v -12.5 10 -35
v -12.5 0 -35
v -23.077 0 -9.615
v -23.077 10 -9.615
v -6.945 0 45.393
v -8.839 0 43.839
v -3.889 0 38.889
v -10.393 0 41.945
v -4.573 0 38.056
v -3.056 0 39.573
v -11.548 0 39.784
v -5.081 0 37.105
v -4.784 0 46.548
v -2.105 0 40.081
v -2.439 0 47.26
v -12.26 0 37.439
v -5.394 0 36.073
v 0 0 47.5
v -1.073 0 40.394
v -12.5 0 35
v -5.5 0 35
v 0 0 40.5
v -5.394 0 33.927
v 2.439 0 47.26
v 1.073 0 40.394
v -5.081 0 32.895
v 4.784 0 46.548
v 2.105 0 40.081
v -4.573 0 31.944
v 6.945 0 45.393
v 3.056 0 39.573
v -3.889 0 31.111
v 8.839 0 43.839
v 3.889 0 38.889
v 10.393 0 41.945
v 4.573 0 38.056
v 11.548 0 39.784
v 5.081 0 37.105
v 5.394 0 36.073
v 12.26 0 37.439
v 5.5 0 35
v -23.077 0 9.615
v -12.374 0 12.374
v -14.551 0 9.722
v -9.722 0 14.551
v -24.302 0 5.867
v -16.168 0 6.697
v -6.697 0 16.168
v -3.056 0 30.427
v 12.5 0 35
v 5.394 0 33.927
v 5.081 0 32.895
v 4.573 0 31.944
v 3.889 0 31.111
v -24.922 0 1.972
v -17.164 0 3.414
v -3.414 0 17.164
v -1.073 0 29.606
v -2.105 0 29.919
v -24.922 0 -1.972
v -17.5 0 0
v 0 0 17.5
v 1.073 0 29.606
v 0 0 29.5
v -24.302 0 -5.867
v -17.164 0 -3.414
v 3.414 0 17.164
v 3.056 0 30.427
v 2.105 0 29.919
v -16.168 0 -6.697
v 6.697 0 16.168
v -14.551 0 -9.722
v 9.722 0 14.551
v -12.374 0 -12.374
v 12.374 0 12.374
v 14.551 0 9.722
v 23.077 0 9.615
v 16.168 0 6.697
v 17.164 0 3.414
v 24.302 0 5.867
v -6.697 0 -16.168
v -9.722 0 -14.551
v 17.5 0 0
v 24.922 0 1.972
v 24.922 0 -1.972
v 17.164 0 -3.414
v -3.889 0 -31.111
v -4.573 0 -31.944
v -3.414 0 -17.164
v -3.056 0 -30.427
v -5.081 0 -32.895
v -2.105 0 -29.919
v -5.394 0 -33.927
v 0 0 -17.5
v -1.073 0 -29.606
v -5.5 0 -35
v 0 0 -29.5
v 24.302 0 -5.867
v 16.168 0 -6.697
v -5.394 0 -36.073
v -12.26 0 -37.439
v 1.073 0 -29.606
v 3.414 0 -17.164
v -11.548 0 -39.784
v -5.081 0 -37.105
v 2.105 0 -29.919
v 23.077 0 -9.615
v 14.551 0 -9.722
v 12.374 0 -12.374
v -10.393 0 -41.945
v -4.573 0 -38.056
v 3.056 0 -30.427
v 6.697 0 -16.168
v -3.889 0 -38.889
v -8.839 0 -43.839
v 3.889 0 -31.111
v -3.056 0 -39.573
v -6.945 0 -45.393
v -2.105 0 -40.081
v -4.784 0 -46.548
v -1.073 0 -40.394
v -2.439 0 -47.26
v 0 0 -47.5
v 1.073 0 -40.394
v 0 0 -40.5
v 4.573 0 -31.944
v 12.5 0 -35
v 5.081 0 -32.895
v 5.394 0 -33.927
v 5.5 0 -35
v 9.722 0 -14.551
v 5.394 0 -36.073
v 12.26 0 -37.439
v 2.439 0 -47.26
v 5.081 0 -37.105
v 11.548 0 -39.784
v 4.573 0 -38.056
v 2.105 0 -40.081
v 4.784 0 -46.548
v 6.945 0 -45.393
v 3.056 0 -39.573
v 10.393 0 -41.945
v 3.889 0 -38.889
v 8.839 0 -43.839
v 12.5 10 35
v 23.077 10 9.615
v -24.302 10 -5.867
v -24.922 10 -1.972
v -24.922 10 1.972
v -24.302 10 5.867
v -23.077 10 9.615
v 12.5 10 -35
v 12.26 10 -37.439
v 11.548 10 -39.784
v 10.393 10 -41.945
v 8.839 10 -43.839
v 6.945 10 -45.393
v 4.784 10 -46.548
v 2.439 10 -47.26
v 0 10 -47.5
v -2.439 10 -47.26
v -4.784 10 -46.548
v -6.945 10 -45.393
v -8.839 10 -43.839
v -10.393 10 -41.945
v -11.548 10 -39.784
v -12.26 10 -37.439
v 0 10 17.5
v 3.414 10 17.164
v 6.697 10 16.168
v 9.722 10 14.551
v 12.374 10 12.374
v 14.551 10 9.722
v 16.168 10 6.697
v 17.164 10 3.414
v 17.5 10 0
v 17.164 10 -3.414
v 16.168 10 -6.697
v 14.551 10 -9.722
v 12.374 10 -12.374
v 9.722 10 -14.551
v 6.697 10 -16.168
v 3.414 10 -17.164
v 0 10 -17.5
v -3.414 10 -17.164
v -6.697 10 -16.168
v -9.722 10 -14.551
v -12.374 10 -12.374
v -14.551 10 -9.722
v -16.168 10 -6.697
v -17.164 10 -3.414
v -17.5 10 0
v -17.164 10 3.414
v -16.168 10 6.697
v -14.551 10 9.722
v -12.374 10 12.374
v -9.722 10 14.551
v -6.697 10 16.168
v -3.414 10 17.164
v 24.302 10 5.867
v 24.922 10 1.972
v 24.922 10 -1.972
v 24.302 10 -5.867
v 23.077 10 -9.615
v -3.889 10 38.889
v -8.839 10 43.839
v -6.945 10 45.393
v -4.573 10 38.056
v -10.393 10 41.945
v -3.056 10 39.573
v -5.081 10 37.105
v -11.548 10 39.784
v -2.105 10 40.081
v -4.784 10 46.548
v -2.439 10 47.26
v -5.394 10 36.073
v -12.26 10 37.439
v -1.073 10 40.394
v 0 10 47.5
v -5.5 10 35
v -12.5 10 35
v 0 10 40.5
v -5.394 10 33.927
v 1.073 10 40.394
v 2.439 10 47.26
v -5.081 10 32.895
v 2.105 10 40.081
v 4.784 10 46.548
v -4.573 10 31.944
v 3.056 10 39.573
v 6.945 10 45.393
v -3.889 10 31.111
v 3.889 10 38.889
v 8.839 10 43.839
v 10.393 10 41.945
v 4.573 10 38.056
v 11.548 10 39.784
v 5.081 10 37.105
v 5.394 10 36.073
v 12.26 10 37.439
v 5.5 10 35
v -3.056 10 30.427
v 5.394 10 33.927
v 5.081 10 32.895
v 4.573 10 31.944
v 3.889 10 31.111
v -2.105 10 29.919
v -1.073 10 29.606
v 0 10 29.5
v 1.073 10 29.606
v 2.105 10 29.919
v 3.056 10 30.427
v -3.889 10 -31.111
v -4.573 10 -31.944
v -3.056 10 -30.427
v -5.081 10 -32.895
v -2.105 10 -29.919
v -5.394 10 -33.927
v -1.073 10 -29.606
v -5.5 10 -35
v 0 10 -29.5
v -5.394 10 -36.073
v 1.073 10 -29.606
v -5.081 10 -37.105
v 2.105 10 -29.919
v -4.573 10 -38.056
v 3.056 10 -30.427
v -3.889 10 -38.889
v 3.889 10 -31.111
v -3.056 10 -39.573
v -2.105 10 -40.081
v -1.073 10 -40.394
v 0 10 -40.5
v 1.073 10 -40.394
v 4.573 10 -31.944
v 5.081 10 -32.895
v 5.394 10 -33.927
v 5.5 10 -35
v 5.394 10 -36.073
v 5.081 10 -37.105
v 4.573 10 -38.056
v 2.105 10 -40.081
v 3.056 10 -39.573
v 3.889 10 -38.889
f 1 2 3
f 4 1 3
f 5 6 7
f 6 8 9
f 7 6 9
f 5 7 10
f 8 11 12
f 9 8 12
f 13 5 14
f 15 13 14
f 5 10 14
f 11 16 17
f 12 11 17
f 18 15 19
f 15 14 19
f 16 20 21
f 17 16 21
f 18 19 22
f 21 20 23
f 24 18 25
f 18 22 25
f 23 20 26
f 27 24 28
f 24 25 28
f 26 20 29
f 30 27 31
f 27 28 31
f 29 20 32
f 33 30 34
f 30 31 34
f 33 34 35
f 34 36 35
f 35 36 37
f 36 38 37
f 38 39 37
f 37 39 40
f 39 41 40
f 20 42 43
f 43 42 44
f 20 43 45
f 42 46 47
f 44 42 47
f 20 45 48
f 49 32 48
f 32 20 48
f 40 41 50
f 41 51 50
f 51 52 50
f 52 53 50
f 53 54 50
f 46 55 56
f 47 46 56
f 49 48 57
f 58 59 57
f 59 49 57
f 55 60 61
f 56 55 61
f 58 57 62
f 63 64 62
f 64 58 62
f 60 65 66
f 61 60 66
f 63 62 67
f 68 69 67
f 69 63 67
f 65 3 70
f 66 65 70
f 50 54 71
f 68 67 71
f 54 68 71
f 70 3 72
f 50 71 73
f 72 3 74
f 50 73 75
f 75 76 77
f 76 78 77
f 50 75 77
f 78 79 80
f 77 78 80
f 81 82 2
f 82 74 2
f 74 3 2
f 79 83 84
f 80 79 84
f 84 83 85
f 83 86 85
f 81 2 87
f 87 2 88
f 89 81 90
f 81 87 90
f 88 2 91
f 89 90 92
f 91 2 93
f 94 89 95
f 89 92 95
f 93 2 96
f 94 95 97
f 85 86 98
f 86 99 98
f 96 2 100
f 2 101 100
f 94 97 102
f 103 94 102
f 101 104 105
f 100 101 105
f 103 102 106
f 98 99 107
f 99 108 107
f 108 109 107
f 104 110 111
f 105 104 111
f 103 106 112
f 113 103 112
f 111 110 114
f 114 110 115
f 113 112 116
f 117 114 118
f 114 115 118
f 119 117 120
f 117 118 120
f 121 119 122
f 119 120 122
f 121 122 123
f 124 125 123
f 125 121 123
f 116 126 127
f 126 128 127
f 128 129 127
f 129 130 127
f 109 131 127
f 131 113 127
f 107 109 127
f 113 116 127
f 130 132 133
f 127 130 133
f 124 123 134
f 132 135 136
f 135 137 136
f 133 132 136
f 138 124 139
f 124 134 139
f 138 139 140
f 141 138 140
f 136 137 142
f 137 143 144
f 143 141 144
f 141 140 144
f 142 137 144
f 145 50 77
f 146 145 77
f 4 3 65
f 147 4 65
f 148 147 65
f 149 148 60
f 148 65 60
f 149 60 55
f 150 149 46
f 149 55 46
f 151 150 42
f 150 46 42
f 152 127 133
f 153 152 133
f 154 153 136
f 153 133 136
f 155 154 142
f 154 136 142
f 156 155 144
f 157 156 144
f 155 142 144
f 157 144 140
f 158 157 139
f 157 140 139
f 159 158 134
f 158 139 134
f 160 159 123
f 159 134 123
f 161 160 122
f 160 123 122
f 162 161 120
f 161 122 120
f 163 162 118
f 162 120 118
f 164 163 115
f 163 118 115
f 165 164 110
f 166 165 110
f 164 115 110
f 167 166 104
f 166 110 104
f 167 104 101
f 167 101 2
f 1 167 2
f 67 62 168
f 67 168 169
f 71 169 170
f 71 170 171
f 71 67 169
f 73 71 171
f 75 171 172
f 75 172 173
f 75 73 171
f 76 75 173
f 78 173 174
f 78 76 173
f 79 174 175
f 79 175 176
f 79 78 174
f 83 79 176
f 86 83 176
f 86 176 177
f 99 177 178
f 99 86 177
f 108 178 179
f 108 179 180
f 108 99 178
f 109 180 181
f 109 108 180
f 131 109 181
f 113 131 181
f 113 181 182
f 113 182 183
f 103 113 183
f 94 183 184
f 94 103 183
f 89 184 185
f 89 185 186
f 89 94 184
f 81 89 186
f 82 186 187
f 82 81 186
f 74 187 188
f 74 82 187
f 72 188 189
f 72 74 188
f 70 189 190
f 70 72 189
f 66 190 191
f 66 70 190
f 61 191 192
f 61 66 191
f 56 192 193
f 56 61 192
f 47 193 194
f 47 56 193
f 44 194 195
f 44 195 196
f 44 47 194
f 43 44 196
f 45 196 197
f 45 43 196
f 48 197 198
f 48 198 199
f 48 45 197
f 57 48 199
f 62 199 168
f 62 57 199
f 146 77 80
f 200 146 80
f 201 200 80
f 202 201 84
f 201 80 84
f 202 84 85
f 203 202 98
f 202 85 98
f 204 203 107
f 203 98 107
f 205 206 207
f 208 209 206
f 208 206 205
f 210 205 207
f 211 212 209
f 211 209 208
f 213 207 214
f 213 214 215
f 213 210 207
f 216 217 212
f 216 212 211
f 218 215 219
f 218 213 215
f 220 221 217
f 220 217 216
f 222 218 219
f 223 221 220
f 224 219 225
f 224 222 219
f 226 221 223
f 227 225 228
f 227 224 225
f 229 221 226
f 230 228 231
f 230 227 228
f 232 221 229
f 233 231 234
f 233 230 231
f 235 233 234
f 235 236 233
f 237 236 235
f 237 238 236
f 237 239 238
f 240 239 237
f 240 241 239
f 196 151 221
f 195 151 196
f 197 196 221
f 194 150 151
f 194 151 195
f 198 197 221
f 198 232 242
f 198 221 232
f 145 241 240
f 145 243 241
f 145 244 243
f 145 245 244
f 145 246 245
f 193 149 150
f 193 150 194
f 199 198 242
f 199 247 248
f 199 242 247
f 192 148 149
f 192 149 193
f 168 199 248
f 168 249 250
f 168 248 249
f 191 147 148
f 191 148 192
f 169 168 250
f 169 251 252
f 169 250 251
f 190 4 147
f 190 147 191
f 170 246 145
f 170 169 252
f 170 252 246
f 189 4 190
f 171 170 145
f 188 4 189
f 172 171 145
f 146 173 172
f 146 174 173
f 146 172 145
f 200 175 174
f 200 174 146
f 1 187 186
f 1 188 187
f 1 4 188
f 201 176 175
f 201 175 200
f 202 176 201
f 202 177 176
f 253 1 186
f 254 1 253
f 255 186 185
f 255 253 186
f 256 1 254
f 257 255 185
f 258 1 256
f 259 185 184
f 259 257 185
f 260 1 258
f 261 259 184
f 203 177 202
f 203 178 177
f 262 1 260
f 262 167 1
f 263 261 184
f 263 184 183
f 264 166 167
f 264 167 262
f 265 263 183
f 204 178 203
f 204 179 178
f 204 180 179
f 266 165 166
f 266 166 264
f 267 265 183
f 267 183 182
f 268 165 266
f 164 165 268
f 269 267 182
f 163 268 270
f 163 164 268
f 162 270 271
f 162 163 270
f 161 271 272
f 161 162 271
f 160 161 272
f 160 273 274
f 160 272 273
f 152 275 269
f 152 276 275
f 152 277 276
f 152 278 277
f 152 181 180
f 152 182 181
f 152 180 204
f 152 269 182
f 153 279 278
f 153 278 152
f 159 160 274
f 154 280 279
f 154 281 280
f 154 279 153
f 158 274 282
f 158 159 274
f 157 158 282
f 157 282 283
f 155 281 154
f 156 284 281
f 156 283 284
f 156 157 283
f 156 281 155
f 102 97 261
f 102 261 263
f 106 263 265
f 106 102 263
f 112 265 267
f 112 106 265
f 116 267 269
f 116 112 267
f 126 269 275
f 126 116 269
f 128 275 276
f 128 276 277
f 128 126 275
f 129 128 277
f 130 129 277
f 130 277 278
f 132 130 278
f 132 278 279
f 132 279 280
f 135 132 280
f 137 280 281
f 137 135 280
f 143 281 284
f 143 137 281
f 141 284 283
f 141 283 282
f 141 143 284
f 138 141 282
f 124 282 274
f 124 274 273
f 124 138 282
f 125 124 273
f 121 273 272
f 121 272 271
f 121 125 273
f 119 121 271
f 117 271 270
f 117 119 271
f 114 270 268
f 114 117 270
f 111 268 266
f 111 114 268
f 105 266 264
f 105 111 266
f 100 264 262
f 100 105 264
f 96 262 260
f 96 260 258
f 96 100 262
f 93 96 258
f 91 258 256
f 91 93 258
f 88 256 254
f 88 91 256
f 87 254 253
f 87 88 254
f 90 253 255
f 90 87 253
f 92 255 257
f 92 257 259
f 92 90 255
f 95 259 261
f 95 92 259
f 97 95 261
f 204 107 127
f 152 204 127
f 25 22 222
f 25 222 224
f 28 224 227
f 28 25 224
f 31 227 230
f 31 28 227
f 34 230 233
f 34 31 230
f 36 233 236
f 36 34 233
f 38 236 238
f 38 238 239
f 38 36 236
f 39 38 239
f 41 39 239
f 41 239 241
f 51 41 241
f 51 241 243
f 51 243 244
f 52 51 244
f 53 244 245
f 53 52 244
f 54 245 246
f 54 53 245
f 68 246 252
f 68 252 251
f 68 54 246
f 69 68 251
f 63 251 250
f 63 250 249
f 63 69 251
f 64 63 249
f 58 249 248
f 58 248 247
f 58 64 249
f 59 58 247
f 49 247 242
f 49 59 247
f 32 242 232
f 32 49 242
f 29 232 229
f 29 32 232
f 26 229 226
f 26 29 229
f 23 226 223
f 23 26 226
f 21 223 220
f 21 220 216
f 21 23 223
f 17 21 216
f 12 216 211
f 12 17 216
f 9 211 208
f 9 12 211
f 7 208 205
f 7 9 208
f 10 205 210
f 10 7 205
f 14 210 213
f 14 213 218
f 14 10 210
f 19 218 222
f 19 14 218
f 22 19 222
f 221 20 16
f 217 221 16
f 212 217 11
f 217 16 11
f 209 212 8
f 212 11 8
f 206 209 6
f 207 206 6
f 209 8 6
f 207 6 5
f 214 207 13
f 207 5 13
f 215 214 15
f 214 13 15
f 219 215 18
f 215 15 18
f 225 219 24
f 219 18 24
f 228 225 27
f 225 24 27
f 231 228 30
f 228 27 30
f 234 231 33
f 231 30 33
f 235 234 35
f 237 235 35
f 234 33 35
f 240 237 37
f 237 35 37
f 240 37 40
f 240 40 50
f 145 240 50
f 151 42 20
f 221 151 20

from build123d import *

# Parameters (mm, degrees)
SKETCH2_R           = 20
SKETCH2_R_2         = 5.5
SKETCH2_R_3         = 17.5
BOSS_EXTRUDE3_DEPTH = 10


with BuildPart() as part:
    # Sketch2 → Boss-Extrude3 (new body)
    # profile 1 of 2: a face of its own
    with BuildSketch(Plane(origin=(0, 0, 0), x_dir=(1, 0, 0), z_dir=(0, 1, 0))):
        with BuildLine():
            Line((-12.5, 35), (-23.076923077, 9.615384615))
            ThreePointArc((-23.076923077, 9.615384615), (-25, 0), (-23.076923077, -9.615384615))
            Line((-23.076923077, -9.615384615), (-12.5, -35))
            ThreePointArc((-12.5, -35), (0, -47.5), (12.5, -35))
            Line((12.5, -35), (23.076923077, -9.615384615))
            ThreePointArc((23.076923077, -9.615384615), (25, 0), (23.076923077, 9.615384615))
            Line((23.076923077, 9.615384615), (12.5, 35))
            ThreePointArc((12.5, 35), (0, 47.5), (-12.5, 35))
        make_face()
        Circle(SKETCH2_R, mode=Mode.SUBTRACT)
        with Locations(Location((0, 35, 0), (0, 0, 270))):
            Circle(SKETCH2_R_2, mode=Mode.SUBTRACT)
        with Locations(Location((0, -35, 0), (0, 0, 270))):
            Circle(SKETCH2_R_2, mode=Mode.SUBTRACT)
    # profile 2 of 2: a face of its own
    with BuildSketch(Plane(origin=(0, 0, 0), x_dir=(1, 0, 0), z_dir=(0, 1, 0))):
        Circle(SKETCH2_R)
        with Locations(Location((0, 0, 0), (0, 0, 270))):
            Circle(SKETCH2_R_3, mode=Mode.SUBTRACT)
    extrude(amount=BOSS_EXTRUDE3_DEPTH)


solid = part.part
